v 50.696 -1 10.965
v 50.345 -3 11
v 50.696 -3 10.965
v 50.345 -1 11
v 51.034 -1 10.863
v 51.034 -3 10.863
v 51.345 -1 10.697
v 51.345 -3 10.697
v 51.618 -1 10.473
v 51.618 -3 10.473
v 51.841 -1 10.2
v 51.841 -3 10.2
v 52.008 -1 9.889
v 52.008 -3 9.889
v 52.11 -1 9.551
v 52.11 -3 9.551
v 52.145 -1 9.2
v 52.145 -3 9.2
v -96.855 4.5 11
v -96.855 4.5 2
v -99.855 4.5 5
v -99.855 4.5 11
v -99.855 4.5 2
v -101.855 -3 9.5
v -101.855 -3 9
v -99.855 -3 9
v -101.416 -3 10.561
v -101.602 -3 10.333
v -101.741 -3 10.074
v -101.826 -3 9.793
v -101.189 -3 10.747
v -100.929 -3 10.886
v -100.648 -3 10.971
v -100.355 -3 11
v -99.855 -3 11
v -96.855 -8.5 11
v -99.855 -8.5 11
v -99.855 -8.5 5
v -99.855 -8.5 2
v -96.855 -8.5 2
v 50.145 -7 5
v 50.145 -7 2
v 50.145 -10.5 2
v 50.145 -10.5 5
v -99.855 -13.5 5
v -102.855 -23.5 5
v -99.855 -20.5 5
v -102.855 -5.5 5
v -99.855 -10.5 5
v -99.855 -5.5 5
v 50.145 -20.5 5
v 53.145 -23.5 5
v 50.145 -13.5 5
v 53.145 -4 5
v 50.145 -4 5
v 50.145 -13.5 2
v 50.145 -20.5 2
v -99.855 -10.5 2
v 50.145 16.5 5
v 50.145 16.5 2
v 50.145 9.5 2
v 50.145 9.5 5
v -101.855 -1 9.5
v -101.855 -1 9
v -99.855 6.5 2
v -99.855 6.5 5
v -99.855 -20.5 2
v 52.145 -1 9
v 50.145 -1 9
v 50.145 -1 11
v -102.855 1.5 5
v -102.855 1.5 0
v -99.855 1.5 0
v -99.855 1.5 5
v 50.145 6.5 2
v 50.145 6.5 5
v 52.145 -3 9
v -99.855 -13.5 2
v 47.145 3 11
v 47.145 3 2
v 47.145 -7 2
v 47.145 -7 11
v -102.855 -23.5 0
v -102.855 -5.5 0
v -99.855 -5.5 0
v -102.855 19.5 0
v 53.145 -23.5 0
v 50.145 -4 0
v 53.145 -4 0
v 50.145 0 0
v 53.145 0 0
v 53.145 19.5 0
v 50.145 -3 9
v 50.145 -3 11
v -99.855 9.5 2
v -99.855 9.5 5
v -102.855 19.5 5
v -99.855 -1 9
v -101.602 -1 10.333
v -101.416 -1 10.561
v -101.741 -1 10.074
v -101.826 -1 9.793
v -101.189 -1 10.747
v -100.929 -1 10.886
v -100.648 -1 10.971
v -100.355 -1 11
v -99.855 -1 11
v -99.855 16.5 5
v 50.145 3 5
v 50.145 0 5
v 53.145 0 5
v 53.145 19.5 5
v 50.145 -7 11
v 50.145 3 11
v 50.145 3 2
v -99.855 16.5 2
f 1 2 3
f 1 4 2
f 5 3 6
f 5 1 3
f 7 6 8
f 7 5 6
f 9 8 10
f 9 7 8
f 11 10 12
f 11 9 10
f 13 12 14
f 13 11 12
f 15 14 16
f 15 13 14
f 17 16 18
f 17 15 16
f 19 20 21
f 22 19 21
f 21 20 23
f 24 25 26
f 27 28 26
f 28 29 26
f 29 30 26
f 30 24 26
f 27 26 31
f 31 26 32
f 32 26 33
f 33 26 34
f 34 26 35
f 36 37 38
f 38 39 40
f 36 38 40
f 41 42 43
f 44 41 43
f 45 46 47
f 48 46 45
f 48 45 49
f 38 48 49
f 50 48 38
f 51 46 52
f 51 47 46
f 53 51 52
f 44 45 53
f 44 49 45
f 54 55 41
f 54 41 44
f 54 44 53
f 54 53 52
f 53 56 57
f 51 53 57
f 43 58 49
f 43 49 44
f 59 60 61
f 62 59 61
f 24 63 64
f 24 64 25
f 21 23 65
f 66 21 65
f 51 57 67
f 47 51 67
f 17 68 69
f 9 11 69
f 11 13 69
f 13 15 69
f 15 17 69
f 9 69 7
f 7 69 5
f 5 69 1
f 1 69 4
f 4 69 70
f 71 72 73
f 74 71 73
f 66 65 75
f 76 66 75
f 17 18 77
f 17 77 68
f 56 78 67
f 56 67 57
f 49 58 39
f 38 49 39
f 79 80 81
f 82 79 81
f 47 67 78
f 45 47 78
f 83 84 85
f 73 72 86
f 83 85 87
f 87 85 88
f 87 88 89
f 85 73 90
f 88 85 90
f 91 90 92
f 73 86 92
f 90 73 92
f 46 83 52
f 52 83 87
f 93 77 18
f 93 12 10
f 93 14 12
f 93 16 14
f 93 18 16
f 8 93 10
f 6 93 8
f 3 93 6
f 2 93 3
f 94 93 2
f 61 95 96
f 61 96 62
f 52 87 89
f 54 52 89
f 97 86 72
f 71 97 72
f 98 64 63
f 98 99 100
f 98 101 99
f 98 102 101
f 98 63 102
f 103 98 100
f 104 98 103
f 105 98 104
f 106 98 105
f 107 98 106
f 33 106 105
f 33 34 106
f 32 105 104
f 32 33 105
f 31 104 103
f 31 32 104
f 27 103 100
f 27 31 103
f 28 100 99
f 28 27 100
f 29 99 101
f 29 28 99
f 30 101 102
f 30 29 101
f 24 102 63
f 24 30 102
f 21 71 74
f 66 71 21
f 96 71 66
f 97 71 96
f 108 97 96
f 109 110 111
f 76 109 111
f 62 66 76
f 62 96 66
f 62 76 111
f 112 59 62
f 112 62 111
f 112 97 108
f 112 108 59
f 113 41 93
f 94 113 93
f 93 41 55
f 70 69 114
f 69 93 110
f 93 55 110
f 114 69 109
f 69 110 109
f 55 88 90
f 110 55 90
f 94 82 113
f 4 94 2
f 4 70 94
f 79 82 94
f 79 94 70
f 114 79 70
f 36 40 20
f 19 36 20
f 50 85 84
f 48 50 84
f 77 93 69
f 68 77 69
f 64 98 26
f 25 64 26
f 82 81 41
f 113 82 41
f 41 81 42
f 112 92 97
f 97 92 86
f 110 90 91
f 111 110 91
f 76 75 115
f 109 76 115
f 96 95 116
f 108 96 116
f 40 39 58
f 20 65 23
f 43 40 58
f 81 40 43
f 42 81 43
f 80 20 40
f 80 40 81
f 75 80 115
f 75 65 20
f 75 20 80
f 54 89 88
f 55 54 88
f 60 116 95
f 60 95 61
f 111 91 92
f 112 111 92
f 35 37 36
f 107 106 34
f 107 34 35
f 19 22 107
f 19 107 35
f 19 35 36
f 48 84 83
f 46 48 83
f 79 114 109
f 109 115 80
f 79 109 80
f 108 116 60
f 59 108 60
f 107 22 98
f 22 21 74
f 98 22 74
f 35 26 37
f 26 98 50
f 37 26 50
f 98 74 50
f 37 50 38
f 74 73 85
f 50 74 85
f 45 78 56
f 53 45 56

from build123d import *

# Parameters (mm, degrees)
F0_W     = 150
F0_H     = 3
F1_DEPTH = 5
F0_H_2   = 7
F2_DEPTH = 2
F3_DEPTH = 11
F5_W     = 2
F5_H     = 2
F6_DEPTH = 2
F7_R     = 1.5
F8_W     = 2
F8_H     = 2
F9_DEPTH = 2
F10_R    = 1.8


with BuildPart() as f1:
    # F0 (on Top) → F1 (new body)
    with BuildSketch(Plane.XY):
        Polygon((53.1447380781, 19.5), (-102.8552619219, 19.5), (-102.8552619219, 1.5), (-99.8552619219, 1.5), (-99.8552619219, 4.5), (-99.8552619219, 6.5), (-99.8552619219, 9.5), (-99.8552619219, 16.5), (50.1447380781, 16.5), (50.1447380781, 9.5), (50.1447380781, 6.5), (50.1447380781, 3), (50.1447380781, 0), (53.1447380781, 0), align=None)
        Polygon((-99.8552619219, 4.5), (-99.8552619219, 1.5), (-99.8552619219, -5.5), (-99.8552619219, -8.5), (-96.8552619219, -8.5), (-96.8552619219, 4.5), align=None)
        Polygon((-99.8552619219, -5.5), (-102.8552619219, -5.5), (-102.8552619219, -23.5), (53.1447380781, -23.5), (53.1447380781, -4), (50.1447380781, -4), (50.1447380781, -7), (50.1447380781, -10.5), (50.1447380781, -13.5), (50.1447380781, -20.5), (-99.8552619219, -20.5), (-99.8552619219, -13.5), (-99.8552619219, -10.5), (-99.8552619219, -8.5), align=None)
        with Locations((-24.8552619219, -12)):
            Rectangle(F0_W, F0_H)
        with Locations((-24.8552619219, 8)):
            Rectangle(F0_W, F0_H)
        Polygon((50.1447380781, -4), (50.1447380781, 0), (50.1447380781, 3), (47.1447380781, 3), (47.1447380781, -7), (50.1447380781, -7), align=None)
    extrude(amount=F1_DEPTH)

    # F0 (on Top) → F2 (join)
    with BuildSketch(Plane.XY):
        with Locations((-24.8552619219, 13)):
            Rectangle(F0_W, F0_H_2)
        Polygon((-99.8552619219, 6.5), (-99.8552619219, 4.5), (-96.8552619219, 4.5), (-96.8552619219, -8.5), (-99.8552619219, -8.5), (-99.8552619219, -10.5), (50.1447380781, -10.5), (50.1447380781, -7), (47.1447380781, -7), (47.1447380781, 3), (50.1447380781, 3), (50.1447380781, 6.5), align=None)
        with Locations((-24.8552619219, -17)):
            Rectangle(F0_W, F0_H_2)
    extrude(amount=F2_DEPTH)


with BuildPart() as f3:
    # F0 (on Top) → F3 (new body)
    with BuildSketch(Plane.XY):
        Polygon((-99.8552619219, 4.5), (-99.8552619219, 1.5), (-99.8552619219, -5.5), (-99.8552619219, -8.5), (-96.8552619219, -8.5), (-96.8552619219, 4.5), align=None)
    extrude(amount=F3_DEPTH)


with BuildPart() as f3b:
    # F0 (on Top) → F3, piece 2 (new body)
    with BuildSketch(Plane.XY):
        Polygon((50.1447380781, -4), (50.1447380781, 0), (50.1447380781, 3), (47.1447380781, 3), (47.1447380781, -7), (50.1447380781, -7), align=None)
    extrude(amount=F3_DEPTH)


with BuildPart() as f1_1:
    add(f1.part)

    # F4: union F3b, F3
    add(f3b.part)
    add(f3.part)

    # F5 (on face) → F6 (join)
    with BuildSketch(Plane(origin=(-99.8552619219, 0, 0), x_dir=(0, -1, 0), z_dir=(-1, 0, 0))):
        with Locations((2, 10)):
            Rectangle(F5_W, F5_H)
    extrude(amount=F6_DEPTH)

    # F7
    f7_edges = [f1_1.edges().sort_by_distance(p)[0] for p in [
        (-101.855262, -2, 11),
    ]]
    fillet(f7_edges, radius=F7_R)

    # F8 (on face) → F9 (join)
    with BuildSketch(Plane.YZ.offset(50.1447380781)):
        with Locations((-2, 10)):
            Rectangle(F8_W, F8_H)
    extrude(amount=F9_DEPTH)

    # F10
    f10_edges = [f1_1.edges().sort_by_distance(p)[0] for p in [
        (52.144738, -2, 11),
    ]]
    fillet(f10_edges, radius=F10_R)


solid = f1_1.part
